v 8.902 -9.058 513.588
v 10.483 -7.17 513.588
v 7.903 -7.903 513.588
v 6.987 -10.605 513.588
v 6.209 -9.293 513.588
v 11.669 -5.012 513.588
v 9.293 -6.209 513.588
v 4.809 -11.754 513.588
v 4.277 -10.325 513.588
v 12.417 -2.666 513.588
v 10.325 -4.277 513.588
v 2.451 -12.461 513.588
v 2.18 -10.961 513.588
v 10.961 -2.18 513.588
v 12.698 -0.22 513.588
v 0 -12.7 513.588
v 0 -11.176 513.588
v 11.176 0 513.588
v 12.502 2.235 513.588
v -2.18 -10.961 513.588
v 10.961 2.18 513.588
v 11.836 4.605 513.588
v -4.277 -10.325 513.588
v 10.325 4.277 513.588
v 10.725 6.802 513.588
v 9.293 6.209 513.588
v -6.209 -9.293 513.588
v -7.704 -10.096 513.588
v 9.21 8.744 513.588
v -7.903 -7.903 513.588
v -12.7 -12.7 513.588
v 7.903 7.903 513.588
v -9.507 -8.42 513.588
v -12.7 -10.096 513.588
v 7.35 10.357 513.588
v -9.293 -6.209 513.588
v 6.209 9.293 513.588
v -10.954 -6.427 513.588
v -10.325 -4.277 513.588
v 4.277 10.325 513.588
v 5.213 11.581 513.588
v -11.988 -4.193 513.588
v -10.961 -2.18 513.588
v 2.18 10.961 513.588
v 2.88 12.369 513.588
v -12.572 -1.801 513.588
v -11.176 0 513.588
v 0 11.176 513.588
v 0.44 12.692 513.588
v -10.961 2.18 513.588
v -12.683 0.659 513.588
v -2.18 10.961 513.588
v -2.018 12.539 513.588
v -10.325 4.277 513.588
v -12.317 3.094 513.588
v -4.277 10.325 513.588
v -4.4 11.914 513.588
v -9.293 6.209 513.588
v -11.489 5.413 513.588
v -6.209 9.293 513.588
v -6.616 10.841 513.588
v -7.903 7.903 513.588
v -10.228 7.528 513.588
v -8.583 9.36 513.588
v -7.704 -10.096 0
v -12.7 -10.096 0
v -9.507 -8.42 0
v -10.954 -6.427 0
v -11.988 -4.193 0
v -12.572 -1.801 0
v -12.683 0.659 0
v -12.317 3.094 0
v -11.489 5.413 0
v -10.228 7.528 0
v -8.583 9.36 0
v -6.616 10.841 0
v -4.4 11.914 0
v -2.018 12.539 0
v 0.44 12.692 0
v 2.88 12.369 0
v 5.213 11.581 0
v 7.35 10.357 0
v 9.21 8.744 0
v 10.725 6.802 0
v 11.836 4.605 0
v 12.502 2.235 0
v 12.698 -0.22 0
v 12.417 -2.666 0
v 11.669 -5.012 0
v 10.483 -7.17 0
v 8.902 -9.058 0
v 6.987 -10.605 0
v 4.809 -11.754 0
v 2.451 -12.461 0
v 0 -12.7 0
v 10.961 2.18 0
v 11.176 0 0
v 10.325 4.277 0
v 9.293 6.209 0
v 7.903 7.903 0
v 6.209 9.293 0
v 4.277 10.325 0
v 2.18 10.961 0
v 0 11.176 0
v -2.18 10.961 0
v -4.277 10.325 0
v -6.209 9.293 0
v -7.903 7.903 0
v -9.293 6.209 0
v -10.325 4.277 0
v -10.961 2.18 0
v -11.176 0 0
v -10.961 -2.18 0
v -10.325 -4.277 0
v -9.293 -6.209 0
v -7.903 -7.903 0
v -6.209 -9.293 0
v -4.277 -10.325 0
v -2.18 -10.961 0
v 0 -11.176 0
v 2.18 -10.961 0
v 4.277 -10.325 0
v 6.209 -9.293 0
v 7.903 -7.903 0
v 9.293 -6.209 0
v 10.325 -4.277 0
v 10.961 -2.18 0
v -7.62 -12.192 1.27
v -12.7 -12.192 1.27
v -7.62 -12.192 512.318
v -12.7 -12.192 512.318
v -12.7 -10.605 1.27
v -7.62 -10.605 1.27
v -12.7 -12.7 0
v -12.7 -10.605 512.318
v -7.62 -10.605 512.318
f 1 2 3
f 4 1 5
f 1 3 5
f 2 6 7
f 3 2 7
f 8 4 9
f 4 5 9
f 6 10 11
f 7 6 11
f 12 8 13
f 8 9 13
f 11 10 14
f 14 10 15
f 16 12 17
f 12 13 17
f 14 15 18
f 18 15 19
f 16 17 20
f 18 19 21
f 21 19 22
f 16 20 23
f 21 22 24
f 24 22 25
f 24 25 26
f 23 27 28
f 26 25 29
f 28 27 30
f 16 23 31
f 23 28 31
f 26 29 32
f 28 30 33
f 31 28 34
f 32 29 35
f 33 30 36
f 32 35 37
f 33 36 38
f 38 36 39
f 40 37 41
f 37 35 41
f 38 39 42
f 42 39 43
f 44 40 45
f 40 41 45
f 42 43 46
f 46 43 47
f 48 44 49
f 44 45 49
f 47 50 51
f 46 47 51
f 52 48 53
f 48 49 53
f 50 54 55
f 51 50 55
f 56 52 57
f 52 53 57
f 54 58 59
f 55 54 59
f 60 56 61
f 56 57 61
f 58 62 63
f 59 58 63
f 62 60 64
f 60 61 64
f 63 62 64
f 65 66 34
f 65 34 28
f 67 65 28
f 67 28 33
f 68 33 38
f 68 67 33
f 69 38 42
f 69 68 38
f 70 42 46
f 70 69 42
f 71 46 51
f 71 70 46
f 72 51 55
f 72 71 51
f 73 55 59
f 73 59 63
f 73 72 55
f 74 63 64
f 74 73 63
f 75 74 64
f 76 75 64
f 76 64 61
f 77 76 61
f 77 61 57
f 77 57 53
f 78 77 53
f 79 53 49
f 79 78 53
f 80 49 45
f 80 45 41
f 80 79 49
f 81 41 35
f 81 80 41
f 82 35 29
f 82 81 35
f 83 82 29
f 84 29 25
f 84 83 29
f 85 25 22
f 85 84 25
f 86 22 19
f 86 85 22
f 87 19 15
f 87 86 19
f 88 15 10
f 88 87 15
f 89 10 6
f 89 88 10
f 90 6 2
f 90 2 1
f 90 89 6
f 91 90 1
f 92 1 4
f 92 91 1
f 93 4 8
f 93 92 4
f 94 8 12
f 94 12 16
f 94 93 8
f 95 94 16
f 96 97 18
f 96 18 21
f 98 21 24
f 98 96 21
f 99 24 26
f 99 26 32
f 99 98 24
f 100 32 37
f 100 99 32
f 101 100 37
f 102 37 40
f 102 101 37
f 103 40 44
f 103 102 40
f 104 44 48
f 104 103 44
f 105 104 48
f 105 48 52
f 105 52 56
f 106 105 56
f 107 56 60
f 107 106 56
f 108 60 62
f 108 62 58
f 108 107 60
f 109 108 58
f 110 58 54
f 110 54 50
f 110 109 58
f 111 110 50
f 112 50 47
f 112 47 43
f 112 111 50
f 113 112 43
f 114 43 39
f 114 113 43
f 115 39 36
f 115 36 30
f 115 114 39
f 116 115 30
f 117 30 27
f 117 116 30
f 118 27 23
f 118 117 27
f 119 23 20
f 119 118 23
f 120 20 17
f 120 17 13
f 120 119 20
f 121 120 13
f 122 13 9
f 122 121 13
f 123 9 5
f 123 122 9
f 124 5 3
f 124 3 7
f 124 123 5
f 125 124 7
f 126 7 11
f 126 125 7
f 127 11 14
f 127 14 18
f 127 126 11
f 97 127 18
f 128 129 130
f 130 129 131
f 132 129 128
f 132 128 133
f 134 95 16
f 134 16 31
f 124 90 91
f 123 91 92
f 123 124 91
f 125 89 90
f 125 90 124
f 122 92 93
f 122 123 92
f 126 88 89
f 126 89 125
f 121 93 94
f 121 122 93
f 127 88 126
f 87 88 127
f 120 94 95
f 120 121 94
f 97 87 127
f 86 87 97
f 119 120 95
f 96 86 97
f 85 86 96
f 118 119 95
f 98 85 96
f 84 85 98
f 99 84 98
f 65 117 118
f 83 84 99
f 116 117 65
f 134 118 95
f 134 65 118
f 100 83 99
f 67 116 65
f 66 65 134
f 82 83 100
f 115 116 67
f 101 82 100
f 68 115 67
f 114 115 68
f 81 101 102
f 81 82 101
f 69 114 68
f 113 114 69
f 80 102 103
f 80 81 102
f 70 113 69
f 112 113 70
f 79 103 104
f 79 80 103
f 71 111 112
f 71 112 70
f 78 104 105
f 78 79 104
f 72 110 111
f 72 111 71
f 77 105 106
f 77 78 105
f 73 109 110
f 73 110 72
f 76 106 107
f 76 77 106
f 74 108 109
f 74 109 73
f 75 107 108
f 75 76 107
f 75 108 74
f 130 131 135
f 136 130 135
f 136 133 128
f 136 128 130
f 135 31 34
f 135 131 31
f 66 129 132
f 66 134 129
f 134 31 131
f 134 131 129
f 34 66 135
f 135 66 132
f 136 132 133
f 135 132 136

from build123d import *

# Parameters (mm, degrees)
SKETCH1_R           = 11.176
BOSS_EXTRUDE1_DEPTH = 513.588
SKETCH2_W           = 511.048
SKETCH2_H           = 1.5875
CUT_EXTRUDE1_DEPTH  = 5.08


with BuildPart() as part:
    # Sketch1 → Boss-Extrude1 (new body)
    with BuildSketch(Plane.XY):
        with BuildLine():
            Line((0, -12.7), (-12.7, -12.7))
            Line((-12.7, -12.7), (-12.7, -10.0965))
            Line((-12.7, -10.0965), (-7.703939755, -10.0965))
            ThreePointArc((-7.703939755, -10.0965), (4.065983891, 12.031532529), (0, -12.7))
        make_face()
        Circle(SKETCH1_R, mode=Mode.SUBTRACT)
    extrude(amount=BOSS_EXTRUDE1_DEPTH)

    # Sketch2 → Cut-Extrude1 (cut)
    with BuildSketch(Plane.ZY.offset(12.7)):
        with Locations((256.794, -11.39825)):
            Rectangle(SKETCH2_W, SKETCH2_H)
    extrude(amount=-CUT_EXTRUDE1_DEPTH, mode=Mode.SUBTRACT)


solid = part.part
